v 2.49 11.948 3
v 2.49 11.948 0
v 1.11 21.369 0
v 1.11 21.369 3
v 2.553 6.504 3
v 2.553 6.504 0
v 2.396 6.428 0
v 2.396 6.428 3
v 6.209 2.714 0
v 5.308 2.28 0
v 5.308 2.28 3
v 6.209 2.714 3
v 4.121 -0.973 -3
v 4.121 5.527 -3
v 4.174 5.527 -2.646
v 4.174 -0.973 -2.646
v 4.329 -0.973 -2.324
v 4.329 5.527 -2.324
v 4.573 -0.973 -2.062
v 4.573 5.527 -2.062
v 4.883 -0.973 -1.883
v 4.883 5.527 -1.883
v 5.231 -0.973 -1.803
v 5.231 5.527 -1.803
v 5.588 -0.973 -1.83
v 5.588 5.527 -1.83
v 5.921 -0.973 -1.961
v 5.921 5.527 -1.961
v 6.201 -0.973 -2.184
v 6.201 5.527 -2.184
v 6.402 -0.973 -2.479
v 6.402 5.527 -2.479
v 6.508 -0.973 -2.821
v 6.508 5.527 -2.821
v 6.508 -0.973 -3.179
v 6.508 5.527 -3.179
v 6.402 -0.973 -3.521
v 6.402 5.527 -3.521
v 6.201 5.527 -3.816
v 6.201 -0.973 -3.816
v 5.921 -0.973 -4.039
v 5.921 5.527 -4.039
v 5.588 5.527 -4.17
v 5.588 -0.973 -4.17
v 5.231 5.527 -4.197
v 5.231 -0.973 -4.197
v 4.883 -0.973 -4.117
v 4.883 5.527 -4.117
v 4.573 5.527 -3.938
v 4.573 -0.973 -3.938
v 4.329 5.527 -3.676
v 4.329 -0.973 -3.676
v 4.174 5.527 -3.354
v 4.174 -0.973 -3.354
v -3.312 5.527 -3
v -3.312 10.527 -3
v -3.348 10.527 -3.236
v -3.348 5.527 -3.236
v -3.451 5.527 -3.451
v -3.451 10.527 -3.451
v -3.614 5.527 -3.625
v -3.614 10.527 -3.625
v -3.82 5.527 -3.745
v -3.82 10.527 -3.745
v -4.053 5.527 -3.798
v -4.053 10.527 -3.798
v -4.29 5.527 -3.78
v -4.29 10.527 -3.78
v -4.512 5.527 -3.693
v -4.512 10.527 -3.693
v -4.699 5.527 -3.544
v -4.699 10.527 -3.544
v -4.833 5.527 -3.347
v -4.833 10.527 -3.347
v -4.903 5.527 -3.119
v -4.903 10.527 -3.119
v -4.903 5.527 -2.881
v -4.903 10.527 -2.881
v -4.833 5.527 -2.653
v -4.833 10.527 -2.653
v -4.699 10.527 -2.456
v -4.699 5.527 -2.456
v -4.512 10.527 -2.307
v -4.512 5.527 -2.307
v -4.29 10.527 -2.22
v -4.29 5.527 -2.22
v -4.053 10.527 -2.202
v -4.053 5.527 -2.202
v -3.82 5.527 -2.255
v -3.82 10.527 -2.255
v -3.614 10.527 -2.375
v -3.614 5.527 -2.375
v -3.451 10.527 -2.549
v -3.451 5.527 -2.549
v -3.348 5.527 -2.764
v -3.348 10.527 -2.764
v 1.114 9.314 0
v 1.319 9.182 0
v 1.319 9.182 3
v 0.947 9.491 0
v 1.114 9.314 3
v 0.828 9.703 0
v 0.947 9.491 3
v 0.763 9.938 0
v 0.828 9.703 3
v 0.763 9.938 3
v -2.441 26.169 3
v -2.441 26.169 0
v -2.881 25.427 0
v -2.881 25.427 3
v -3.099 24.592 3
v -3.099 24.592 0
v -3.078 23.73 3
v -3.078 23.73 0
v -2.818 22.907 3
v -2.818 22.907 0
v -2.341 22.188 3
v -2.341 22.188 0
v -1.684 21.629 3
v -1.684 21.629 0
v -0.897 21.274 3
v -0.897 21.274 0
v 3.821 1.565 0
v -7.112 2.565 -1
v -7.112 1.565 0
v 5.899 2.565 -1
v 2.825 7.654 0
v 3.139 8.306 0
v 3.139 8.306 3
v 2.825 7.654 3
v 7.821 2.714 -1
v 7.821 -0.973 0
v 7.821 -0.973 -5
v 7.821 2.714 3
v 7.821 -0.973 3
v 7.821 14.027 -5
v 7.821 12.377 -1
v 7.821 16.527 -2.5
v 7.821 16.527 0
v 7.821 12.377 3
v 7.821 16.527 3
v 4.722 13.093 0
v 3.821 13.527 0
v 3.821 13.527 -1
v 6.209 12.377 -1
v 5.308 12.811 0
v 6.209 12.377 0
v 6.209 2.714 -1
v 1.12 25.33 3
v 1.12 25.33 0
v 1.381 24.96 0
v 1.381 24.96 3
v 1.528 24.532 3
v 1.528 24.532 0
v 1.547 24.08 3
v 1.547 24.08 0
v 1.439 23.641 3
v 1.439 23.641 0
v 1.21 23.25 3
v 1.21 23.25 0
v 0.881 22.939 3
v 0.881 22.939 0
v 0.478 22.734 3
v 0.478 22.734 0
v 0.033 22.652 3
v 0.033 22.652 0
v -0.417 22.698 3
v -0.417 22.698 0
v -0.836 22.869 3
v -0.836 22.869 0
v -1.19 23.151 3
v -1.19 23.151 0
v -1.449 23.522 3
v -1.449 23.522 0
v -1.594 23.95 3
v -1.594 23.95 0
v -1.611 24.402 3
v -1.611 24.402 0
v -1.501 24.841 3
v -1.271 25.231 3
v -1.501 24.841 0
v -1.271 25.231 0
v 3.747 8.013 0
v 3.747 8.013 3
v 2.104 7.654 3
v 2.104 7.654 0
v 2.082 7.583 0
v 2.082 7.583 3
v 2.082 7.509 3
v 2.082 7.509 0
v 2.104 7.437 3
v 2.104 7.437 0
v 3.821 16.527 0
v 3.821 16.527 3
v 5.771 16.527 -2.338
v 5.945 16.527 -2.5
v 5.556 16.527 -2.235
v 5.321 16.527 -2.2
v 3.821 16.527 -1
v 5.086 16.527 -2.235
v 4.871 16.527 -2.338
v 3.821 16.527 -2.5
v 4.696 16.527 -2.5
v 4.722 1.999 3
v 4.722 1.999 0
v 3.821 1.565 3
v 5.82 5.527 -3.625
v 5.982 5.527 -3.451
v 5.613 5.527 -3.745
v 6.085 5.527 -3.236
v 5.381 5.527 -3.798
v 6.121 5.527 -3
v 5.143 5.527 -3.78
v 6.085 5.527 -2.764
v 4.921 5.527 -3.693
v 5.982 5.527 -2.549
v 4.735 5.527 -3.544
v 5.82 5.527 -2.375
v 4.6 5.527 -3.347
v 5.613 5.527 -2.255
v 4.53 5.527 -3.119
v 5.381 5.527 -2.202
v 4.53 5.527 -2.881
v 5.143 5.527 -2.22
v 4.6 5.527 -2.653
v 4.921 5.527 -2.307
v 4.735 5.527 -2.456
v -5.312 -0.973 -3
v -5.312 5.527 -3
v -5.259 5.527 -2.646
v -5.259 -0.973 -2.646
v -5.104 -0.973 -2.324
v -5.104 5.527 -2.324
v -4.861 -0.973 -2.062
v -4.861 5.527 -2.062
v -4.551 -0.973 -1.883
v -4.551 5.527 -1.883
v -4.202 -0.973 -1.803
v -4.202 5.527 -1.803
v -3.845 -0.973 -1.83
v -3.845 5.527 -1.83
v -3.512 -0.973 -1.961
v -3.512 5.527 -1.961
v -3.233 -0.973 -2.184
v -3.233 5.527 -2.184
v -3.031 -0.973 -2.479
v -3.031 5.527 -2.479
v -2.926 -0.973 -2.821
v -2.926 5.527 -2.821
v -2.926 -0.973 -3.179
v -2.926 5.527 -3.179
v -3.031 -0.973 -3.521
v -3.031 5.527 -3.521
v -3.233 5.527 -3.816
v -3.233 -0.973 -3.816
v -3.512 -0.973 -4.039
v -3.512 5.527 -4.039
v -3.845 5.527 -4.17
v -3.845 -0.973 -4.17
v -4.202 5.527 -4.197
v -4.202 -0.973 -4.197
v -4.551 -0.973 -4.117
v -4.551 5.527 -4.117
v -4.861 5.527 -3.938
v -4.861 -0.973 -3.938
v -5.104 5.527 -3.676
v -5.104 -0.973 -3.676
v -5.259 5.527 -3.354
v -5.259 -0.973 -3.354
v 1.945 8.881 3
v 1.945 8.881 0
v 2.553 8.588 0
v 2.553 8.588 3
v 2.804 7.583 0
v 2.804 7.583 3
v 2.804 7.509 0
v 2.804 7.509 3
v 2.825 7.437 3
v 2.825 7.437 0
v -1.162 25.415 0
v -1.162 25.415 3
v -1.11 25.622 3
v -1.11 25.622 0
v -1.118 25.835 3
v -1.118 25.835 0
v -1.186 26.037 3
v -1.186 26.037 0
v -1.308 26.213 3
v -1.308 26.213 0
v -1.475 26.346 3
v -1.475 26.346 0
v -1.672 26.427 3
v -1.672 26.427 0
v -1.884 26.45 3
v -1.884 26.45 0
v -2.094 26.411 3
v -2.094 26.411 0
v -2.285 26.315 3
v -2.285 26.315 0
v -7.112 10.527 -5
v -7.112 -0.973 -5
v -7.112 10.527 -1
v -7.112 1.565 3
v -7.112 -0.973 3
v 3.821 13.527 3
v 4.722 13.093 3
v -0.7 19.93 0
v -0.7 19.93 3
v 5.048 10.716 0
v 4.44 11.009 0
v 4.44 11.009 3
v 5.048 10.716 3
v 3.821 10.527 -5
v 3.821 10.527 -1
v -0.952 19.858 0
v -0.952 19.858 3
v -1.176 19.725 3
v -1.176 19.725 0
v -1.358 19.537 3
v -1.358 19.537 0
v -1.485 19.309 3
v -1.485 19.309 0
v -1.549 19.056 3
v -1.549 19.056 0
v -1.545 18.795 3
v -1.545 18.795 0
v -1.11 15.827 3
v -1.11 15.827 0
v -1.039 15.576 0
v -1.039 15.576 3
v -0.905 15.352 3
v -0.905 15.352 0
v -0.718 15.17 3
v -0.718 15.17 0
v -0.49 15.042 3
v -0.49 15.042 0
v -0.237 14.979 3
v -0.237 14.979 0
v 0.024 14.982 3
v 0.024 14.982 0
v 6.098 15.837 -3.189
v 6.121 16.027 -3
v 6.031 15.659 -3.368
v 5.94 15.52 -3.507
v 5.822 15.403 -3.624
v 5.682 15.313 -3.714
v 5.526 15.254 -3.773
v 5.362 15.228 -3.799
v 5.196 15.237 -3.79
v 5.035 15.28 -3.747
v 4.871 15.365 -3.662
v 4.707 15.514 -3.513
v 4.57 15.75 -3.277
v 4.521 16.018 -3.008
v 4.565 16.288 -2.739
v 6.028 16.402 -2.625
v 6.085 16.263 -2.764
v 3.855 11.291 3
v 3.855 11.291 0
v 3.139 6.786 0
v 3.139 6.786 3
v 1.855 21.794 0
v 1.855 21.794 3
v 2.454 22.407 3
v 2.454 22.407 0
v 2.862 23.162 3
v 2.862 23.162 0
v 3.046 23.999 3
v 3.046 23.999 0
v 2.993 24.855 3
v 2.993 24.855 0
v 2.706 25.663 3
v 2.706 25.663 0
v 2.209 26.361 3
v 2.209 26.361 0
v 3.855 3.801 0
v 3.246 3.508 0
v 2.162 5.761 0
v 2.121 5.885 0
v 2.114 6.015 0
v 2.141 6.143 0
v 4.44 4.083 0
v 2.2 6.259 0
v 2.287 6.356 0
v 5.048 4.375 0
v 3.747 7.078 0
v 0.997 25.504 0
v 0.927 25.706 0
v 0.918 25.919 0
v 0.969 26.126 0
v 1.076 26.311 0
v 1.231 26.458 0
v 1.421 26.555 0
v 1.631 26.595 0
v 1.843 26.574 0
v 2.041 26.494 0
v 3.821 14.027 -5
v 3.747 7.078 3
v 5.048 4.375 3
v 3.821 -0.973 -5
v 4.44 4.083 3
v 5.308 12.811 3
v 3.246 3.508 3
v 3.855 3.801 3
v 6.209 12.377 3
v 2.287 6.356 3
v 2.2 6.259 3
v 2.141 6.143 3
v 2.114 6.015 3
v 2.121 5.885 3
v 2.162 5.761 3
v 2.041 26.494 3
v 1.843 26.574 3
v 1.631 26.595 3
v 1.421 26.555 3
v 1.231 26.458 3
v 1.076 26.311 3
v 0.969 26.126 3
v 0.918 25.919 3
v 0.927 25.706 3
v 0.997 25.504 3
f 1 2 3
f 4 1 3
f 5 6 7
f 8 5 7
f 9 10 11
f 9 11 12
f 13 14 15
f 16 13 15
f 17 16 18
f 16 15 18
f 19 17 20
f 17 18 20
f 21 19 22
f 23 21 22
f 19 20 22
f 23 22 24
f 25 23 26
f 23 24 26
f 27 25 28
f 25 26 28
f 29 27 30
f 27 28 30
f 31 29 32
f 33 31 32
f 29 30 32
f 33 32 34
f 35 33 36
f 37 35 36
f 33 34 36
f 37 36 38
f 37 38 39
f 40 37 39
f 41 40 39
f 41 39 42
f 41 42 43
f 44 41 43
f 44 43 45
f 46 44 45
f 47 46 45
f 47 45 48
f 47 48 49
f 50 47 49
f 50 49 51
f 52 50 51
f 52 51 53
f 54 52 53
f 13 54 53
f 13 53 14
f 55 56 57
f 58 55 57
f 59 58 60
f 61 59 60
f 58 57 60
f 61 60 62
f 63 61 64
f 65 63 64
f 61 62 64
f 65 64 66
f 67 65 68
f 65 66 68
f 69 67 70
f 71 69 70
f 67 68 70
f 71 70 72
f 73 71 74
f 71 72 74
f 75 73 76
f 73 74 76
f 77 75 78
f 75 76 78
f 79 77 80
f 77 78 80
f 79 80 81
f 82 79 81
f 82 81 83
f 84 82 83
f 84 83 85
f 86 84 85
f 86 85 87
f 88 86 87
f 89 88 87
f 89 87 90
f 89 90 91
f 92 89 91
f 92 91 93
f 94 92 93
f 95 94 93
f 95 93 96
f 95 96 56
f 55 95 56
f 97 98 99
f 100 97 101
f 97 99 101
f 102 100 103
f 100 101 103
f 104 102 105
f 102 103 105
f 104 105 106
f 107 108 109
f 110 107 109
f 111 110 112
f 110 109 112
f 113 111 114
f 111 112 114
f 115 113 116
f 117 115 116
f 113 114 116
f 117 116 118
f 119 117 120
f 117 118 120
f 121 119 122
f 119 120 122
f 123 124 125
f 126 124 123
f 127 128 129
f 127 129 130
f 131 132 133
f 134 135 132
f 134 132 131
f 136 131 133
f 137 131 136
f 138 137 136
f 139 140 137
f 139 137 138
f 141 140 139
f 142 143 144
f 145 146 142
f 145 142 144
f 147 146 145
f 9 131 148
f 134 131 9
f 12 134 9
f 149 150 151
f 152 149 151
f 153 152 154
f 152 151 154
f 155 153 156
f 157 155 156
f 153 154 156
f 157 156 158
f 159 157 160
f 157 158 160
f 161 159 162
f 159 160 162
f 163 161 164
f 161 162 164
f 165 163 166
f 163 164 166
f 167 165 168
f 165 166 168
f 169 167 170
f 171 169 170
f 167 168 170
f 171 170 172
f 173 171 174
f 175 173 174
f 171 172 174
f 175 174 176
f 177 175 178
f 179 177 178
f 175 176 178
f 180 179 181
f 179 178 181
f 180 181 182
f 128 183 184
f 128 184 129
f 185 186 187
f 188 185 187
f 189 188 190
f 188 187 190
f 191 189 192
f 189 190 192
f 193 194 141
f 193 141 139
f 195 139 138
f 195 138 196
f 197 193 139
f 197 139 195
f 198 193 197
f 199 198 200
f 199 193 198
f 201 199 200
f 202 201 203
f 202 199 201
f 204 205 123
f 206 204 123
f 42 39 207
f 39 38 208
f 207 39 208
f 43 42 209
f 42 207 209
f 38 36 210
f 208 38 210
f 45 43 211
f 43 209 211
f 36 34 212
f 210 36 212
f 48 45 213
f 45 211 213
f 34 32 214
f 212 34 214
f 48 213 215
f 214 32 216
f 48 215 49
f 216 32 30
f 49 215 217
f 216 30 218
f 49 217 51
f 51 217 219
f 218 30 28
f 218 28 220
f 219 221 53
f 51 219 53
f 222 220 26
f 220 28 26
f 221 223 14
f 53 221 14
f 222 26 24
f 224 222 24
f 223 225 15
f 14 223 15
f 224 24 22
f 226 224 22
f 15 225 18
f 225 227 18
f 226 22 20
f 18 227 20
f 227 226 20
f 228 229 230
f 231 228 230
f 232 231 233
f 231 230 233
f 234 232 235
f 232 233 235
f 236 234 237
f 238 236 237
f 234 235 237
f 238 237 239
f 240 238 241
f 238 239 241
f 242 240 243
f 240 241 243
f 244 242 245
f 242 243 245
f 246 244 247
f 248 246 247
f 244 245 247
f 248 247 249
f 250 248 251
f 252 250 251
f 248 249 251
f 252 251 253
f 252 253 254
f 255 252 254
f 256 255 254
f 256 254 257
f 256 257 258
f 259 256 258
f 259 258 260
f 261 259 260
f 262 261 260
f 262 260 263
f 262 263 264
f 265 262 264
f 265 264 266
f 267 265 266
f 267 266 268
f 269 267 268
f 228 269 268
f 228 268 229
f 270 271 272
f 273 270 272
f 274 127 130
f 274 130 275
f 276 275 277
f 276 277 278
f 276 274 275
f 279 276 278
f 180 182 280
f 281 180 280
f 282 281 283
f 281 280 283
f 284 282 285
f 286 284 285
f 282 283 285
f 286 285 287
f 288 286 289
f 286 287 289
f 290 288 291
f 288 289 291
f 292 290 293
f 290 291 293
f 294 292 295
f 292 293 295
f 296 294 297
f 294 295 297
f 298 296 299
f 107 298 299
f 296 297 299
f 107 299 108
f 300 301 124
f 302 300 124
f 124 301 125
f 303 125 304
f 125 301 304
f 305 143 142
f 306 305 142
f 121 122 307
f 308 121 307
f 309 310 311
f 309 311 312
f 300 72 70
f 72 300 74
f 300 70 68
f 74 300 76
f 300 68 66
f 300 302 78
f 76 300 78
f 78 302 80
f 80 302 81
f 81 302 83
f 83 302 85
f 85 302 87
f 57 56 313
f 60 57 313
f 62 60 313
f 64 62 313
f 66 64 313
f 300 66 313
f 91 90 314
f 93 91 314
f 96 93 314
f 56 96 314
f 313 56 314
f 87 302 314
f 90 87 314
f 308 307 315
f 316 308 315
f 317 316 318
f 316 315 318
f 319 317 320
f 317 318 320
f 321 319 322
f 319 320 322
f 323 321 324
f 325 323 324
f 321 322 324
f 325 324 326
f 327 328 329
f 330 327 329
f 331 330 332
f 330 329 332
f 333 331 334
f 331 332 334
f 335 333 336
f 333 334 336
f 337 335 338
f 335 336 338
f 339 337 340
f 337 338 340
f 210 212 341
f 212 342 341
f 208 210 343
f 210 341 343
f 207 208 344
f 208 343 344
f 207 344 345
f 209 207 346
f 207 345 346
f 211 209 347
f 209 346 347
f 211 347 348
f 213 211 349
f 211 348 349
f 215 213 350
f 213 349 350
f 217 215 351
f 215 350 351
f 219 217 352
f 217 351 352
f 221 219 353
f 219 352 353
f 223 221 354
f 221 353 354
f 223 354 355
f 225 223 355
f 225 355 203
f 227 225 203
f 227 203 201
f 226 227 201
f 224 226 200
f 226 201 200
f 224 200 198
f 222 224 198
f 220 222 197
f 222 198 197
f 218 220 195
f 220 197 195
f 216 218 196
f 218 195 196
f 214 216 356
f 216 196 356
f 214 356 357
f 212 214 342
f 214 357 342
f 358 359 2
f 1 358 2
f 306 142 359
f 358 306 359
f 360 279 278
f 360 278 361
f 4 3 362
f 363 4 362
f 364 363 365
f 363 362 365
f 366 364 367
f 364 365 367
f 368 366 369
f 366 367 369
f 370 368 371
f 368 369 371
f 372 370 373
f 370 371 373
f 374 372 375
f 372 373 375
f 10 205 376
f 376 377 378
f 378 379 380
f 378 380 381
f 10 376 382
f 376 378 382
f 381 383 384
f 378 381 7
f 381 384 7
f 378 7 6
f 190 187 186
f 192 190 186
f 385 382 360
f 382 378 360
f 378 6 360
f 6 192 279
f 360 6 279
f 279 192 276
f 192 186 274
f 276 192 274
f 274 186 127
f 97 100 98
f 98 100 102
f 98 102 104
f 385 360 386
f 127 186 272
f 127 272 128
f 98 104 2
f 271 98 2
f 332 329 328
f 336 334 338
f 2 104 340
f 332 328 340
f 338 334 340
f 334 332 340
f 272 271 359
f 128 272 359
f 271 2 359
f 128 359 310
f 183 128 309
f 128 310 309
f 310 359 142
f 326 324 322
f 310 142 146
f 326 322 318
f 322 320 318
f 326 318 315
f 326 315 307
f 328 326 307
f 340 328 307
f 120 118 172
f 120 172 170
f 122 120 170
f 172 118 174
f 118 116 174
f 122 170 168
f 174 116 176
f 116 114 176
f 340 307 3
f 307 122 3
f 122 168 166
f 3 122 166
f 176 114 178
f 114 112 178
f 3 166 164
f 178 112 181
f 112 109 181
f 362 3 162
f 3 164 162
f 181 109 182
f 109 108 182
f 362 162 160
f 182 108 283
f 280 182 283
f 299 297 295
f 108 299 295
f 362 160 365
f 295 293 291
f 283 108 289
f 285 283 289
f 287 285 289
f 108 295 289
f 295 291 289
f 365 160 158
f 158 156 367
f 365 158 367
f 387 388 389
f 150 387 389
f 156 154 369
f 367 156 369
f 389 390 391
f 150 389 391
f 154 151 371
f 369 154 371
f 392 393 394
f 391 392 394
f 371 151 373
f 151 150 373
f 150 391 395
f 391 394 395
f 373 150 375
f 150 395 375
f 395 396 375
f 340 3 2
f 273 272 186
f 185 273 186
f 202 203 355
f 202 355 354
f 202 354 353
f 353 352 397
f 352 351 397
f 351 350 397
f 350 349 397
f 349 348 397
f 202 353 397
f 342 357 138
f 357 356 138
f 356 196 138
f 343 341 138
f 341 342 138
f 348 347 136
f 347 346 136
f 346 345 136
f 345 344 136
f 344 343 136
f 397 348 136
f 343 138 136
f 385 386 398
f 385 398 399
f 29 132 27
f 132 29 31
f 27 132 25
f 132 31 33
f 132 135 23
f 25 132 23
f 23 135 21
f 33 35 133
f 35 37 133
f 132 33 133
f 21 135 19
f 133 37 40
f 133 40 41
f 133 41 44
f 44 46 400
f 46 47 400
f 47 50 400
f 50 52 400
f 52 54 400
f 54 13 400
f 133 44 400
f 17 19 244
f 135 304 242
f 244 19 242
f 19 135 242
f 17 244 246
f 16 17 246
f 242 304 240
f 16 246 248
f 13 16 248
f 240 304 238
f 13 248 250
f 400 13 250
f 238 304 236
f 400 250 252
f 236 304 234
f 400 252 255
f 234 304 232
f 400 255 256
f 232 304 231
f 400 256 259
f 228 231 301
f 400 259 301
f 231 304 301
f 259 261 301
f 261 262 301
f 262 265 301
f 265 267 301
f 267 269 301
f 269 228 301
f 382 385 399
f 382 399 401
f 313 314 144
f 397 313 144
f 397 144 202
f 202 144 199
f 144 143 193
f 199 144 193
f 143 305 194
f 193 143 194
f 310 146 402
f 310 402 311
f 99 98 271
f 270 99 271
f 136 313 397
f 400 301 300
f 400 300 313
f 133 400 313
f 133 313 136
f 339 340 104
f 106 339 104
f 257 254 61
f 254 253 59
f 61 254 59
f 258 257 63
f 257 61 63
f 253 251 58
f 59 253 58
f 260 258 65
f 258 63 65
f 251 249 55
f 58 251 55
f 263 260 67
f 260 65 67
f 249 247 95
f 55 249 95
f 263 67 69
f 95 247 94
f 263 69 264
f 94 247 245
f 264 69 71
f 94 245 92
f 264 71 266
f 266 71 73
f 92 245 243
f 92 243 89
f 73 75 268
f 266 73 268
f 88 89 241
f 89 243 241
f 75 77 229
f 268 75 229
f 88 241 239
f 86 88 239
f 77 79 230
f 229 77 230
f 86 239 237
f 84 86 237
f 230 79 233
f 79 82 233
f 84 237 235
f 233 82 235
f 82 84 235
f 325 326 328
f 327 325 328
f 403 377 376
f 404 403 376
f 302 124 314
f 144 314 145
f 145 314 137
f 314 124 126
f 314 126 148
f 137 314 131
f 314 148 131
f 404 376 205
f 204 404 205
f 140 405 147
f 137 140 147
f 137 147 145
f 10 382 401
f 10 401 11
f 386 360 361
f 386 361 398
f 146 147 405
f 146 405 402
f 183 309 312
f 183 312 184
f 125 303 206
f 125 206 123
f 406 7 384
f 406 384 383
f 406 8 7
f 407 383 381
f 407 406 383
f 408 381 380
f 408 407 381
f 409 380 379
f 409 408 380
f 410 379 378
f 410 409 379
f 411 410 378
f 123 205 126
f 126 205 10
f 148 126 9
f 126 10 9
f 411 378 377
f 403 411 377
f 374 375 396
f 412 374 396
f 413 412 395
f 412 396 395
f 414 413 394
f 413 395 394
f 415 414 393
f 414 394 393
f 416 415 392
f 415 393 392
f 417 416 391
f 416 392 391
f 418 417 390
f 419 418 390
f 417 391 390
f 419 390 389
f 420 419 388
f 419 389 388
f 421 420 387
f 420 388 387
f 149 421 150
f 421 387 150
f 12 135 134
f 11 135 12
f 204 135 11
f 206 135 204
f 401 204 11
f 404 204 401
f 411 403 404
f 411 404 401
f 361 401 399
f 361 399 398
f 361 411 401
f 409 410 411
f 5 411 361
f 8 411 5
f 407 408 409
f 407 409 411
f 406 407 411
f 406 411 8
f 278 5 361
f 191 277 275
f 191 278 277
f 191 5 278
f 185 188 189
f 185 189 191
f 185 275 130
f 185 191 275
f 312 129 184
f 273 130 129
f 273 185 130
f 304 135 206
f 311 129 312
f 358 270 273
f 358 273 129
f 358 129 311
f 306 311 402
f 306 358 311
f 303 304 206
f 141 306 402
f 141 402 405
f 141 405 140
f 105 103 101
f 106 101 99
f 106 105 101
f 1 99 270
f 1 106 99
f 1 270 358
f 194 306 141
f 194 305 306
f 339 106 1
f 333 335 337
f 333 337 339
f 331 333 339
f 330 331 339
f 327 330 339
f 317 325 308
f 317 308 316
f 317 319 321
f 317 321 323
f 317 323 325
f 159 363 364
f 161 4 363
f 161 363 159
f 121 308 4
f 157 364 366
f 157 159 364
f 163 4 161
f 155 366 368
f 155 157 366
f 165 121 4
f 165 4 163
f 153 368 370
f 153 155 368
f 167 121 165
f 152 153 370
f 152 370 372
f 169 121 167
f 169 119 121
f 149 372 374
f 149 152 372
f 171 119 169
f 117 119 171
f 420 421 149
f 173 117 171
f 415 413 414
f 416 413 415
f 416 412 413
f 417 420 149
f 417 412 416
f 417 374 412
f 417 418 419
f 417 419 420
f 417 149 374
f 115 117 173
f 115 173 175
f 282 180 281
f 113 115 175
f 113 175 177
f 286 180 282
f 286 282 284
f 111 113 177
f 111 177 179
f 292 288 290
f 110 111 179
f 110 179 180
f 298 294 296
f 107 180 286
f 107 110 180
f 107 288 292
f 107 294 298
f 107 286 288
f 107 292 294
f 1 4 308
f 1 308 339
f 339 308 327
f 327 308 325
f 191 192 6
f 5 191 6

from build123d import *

# Parameters (mm, degrees)
BOSS_SWITCH_BODY_DEPTH        = 3
SKETCH1_W                     = 4
SKETCH1_H                     = 3.687347025
SKETCH1_H_2                   = 4.149321045
BOSS_FLANGE_WIDTH_DEPTH       = 5
BOSS_FLANGE_HEIGHT_REACH      = 35.973
SKETCH2_W                     = 4
SKETCH2_H                     = 4.149321045
SKETCH2_W_2                   = 8
SKETCH2_H_2                   = 2.53802598
SKETCH17_W                    = 14.933333866
SKETCH17_H                    = 4
BOSS_FLANGE_SUPPORT_DEPTH     = 10.812652975
CUT_WALL_GAP_DEPTH            = 1
SKETCH26_W                    = 10.933333866
SKETCH26_H                    = 6
CUT_CAM_SLOPE_CLEARANCE_DEPTH = 31.059873248
TAP_DRILL_FOR_M2X0_4_TAP1_D   = 1.6
M2_CLEARANCE_HOLE2_D          = 2.4
M2_CLEARANCE_HOLE2_DEPTH      = 6.5
CHAMFER_FLANGE_SUPPORT_3_SIZE = 1
SKETCH25_W                    = 5.60571229
SKETCH25_H                    = 17.5
CUT_BASE_REMOVAL_DEPTH        = 3
CHAMFER8_SIZE                 = 2.5
FILLET1_R                     = 1
FILLET2_R                     = 0.5


with BuildPart() as part:
    # Sketch-SwitchBossUp → Boss-Switch Body (new body)
    with BuildSketch(Plane.XY):
        with BuildLine():
            Line((-0.897289862, 21.27382814), (-0.700379438, 19.929528492))
            ThreePointArc((-0.700379438, 19.929528492), (-1.357570909, 19.537245674), (-1.544889614, 18.795155289))
            Line((-1.544889614, 18.795155289), (-1.110095072, 15.826830221))
            ThreePointArc((-1.110095072, 15.826830221), (-0.717812255, 15.169638751), (0.02427813, 14.982320046))
            Line((0.02427813, 14.982320046), (0.840131285, 9.412522958))
            Line((0.840131285, 9.412522958), (1.945259485, 8.880589721))
            Line((1.945259485, 8.880589721), (2.553471215, 8.587838134))
            Line((2.553471215, 8.587838134), (2.104108424, 7.654255765))
            ThreePointArc((2.104108424, 7.654255765), (2.079372028, 7.545829251), (2.104108424, 7.437402737))
            Line((2.104108424, 7.437402737), (2.553471215, 6.503820369))
            Line((2.553471215, 6.503820369), (1.945259485, 6.211068782))
            Line((1.945259485, 6.211068782), (3.246377649, 3.507905538))
            Line((3.246377649, 3.507905538), (3.854589379, 3.800657125))
            Line((3.854589379, 3.800657125), (4.722001489, 1.998548296))
            Line((4.722001489, 1.998548296), (3.820947074, 1.564842241))
            Line((3.820947074, 1.564842241), (3.820947074, -0.973183739))
            Line((3.820947074, -0.973183739), (5.277352178, -0.973183739))
            Line((5.277352178, -0.973183739), (13.426659364, -0.973183739))
            Line((13.426659364, -0.973183739), (13.426659364, 16.526816261))
            Line((13.426659364, 16.526816261), (7.114618425, 16.526816261))
            Line((7.114618425, 16.526816261), (3.820947074, 16.526816261))
            Line((3.820947074, 16.526816261), (3.820947074, 13.526816261))
            Line((3.820947074, 13.526816261), (4.722001489, 13.093110206))
            Line((4.722001489, 13.093110206), (3.854589379, 11.291001377))
            Line((3.854589379, 11.291001377), (2.490115752, 11.94776579))
            Line((2.490115752, 11.94776579), (1.110059725, 21.369353491))
            ThreePointArc((1.110059725, 21.369353491), (2.982945849, 23.574065074), (2.208754741, 26.361372687))
            ThreePointArc((2.208754741, 26.361372687), (1.148478545, 26.389910192), (1.119941041, 25.329633996))
            ThreePointArc((1.119941041, 25.329633996), (0.033089246, 22.651561394), (-1.270789677, 25.230944933))
            ThreePointArc((-1.270789677, 25.230944933), (-1.386617314, 26.285261754), (-2.440934135, 26.169434117))
            ThreePointArc((-2.440934135, 26.169434117), (-2.976976555, 23.309245483), (-0.897289862, 21.27382814))
        make_face()
        with BuildLine():
            Line((6.208741273, 2.714163286), (10.695012416, 2.714163286))
            Line((10.695012416, 2.714163286), (10.695012416, 12.377495216))
            Line((10.695012416, 12.377495216), (6.208741273, 12.377495216))
            Line((6.208741273, 12.377495216), (5.307686858, 12.811201271))
            Line((5.307686858, 12.811201271), (4.440274749, 11.009092442))
            Line((4.440274749, 11.009092442), (5.048486478, 10.716340855))
            Line((5.048486478, 10.716340855), (3.747368314, 8.013177611))
            Line((3.747368314, 8.013177611), (3.139156584, 8.305929198))
            Line((3.139156584, 8.305929198), (2.825485502, 7.654255765))
            ThreePointArc((2.825485502, 7.654255765), (2.800749105, 7.545829251), (2.825485502, 7.437402737))
            Line((2.825485502, 7.437402737), (3.139156584, 6.785729304))
            Line((3.139156584, 6.785729304), (3.747368314, 7.078480891))
            Line((3.747368314, 7.078480891), (5.048486478, 4.375317648))
            Line((5.048486478, 4.375317648), (4.440274749, 4.082566061))
            Line((4.440274749, 4.082566061), (5.307686858, 2.280457231))
            Line((5.307686858, 2.280457231), (6.208741273, 2.714163286))
        make_face(mode=Mode.SUBTRACT)
    extrude(amount=BOSS_SWITCH_BODY_DEPTH)

    # Sketch1 → Boss-Flange Width (add)
    with BuildSketch(Plane(origin=(0, 0, 0), x_dir=(-1, 0, 0), z_dir=(0, 0, -1))):
        with Locations((-5.820947074, 0.870489774)):
            Rectangle(SKETCH1_W, SKETCH1_H)
        with Locations((-5.820947074, 14.452155739)):
            Rectangle(SKETCH1_W, SKETCH1_H_2)
    extrude(amount=BOSS_FLANGE_WIDTH_DEPTH)

    # Sketch2 → Boss-Flange Height (add, up to next)
    with BuildSketch(Plane(origin=(-7.112386792, 0, 0), x_dir=(0, 0, -1), z_dir=(1, 0, 0)), mode=Mode.PRIVATE) as boss_flange_height_sk1:
        with Locations((3, 14.452155739)):
            Rectangle(SKETCH2_W, SKETCH2_H)
    boss_flange_height_tool1 = extrude(boss_flange_height_sk1.sketch, amount=BOSS_FLANGE_HEIGHT_REACH, mode=Mode.PRIVATE) - part.part
    # Sketch2 → Boss-Flange Height (add, up to next)
    with BuildSketch(Plane(origin=(-7.112386792, 0, 0), x_dir=(0, 0, -1), z_dir=(1, 0, 0)), mode=Mode.PRIVATE) as boss_flange_height_sk2:
        with Locations((1, 0.295829251)):
            Rectangle(SKETCH2_W_2, SKETCH2_H_2)
    boss_flange_height_tool2 = extrude(boss_flange_height_sk2.sketch, amount=BOSS_FLANGE_HEIGHT_REACH, mode=Mode.PRIVATE) - part.part
    add(boss_flange_height_tool1.solids().sort_by_distance((-7.112387, 14.452156, -3))[0])
    add(boss_flange_height_tool2.solids().sort_by_distance((-7.112387, 0.295829, -1))[0])

    # Sketch17 → Boss-Flange Support (add)
    with BuildSketch(Plane.XZ.offset(-1.564842241)):
        with Locations((0.354280141, -3)):
            Rectangle(SKETCH17_W, SKETCH17_H)
    extrude(amount=-BOSS_FLANGE_SUPPORT_DEPTH)

    # Sketch27 → Cut-Wall Gap (cut)
    with BuildSketch(Plane.XY):
        Polygon((3.820947074, 13.526816261), (6.208741273, 12.377495216), (3.820947074, 12.377495216), align=None)
        Polygon((6.208741273, 2.714163286), (3.820947074, 2.714163286), (3.820947074, 1.564842241), align=None)
    extrude(amount=-CUT_WALL_GAP_DEPTH, mode=Mode.SUBTRACT)

    # Sketch26 → Cut-Cam Slope Clearance (cut, through all)
    with BuildSketch(Plane.XY.offset(-1)):
        with Locations((-1.645719859, 13.526816261)):
            Rectangle(SKETCH26_W, SKETCH26_H)
    extrude(amount=-CUT_CAM_SLOPE_CLEARANCE_DEPTH, mode=Mode.SUBTRACT)

    # Tap Drill for M2x0.4 Tap1 (through all)
    with Locations(Plane(origin=(0, -0.973183739, 0), x_dir=(-1, 0, 0), z_dir=(0, -1, 0))):
        with Locations((4.112386792, 3), (-5.320947074, 3)):
            Hole(TAP_DRILL_FOR_M2X0_4_TAP1_D / 2)

    # M2 Clearance Hole2
    with Locations(Plane.XZ.offset(0.973183739)):
        with Locations((-4.112386792, -3), (5.320947074, -3)):
            Hole(M2_CLEARANCE_HOLE2_D / 2, depth=M2_CLEARANCE_HOLE2_DEPTH)

    # Chamfer-Flange Support 3
    chamfer_flange_support_3_edges = [part.edges().sort_by_distance(p)[0] for p in [
        (-1.645719859, 1.564842241, -1),
    ]]
    chamfer(chamfer_flange_support_3_edges, length=CHAMFER_FLANGE_SUPPORT_3_SIZE)

    # Sketch25 → Cut-Base Removal (cut)
    with BuildSketch(Plane.XY.offset(3)):
        with Locations((10.623803219, 7.776816261)):
            Rectangle(SKETCH25_W, SKETCH25_H)
    extrude(amount=-CUT_BASE_REMOVAL_DEPTH, mode=Mode.SUBTRACT)

    # Chamfer8
    # the kernel refuses this chamfer: 2.5 mm, written as the material it takes off along each edge
    with BuildSketch(Plane(origin=(14.250154544, 16.526816261, -5), x_dir=(0, 0.027495876610586317, 0.9996219169112968), z_dir=(-1, 0, 0))) as chamfer8_piece_1:
        Polygon((CHAMFER8_SIZE * 0.999621916911, -CHAMFER8_SIZE * 0.0274958766106), (-CHAMFER8_SIZE * 0.0274958766106, -CHAMFER8_SIZE * 0.999621916911), (0, 0), align=None)
    extrude(amount=16.85841494, mode=Mode.SUBTRACT)

    # Fillet1
    fillet1_edges = [part.edges().sort_by_distance(p)[0] for p in [
        (0.840131285, 9.412522958, 1.5),
    ]]
    fillet(fillet1_edges, radius=FILLET1_R)

    # Fillet2
    fillet2_edges = [part.edges().sort_by_distance(p)[0] for p in [
        (1.945259485, 6.211068782, 1.5),
    ]]
    fillet(fillet2_edges, radius=FILLET2_R)


solid = part.part
